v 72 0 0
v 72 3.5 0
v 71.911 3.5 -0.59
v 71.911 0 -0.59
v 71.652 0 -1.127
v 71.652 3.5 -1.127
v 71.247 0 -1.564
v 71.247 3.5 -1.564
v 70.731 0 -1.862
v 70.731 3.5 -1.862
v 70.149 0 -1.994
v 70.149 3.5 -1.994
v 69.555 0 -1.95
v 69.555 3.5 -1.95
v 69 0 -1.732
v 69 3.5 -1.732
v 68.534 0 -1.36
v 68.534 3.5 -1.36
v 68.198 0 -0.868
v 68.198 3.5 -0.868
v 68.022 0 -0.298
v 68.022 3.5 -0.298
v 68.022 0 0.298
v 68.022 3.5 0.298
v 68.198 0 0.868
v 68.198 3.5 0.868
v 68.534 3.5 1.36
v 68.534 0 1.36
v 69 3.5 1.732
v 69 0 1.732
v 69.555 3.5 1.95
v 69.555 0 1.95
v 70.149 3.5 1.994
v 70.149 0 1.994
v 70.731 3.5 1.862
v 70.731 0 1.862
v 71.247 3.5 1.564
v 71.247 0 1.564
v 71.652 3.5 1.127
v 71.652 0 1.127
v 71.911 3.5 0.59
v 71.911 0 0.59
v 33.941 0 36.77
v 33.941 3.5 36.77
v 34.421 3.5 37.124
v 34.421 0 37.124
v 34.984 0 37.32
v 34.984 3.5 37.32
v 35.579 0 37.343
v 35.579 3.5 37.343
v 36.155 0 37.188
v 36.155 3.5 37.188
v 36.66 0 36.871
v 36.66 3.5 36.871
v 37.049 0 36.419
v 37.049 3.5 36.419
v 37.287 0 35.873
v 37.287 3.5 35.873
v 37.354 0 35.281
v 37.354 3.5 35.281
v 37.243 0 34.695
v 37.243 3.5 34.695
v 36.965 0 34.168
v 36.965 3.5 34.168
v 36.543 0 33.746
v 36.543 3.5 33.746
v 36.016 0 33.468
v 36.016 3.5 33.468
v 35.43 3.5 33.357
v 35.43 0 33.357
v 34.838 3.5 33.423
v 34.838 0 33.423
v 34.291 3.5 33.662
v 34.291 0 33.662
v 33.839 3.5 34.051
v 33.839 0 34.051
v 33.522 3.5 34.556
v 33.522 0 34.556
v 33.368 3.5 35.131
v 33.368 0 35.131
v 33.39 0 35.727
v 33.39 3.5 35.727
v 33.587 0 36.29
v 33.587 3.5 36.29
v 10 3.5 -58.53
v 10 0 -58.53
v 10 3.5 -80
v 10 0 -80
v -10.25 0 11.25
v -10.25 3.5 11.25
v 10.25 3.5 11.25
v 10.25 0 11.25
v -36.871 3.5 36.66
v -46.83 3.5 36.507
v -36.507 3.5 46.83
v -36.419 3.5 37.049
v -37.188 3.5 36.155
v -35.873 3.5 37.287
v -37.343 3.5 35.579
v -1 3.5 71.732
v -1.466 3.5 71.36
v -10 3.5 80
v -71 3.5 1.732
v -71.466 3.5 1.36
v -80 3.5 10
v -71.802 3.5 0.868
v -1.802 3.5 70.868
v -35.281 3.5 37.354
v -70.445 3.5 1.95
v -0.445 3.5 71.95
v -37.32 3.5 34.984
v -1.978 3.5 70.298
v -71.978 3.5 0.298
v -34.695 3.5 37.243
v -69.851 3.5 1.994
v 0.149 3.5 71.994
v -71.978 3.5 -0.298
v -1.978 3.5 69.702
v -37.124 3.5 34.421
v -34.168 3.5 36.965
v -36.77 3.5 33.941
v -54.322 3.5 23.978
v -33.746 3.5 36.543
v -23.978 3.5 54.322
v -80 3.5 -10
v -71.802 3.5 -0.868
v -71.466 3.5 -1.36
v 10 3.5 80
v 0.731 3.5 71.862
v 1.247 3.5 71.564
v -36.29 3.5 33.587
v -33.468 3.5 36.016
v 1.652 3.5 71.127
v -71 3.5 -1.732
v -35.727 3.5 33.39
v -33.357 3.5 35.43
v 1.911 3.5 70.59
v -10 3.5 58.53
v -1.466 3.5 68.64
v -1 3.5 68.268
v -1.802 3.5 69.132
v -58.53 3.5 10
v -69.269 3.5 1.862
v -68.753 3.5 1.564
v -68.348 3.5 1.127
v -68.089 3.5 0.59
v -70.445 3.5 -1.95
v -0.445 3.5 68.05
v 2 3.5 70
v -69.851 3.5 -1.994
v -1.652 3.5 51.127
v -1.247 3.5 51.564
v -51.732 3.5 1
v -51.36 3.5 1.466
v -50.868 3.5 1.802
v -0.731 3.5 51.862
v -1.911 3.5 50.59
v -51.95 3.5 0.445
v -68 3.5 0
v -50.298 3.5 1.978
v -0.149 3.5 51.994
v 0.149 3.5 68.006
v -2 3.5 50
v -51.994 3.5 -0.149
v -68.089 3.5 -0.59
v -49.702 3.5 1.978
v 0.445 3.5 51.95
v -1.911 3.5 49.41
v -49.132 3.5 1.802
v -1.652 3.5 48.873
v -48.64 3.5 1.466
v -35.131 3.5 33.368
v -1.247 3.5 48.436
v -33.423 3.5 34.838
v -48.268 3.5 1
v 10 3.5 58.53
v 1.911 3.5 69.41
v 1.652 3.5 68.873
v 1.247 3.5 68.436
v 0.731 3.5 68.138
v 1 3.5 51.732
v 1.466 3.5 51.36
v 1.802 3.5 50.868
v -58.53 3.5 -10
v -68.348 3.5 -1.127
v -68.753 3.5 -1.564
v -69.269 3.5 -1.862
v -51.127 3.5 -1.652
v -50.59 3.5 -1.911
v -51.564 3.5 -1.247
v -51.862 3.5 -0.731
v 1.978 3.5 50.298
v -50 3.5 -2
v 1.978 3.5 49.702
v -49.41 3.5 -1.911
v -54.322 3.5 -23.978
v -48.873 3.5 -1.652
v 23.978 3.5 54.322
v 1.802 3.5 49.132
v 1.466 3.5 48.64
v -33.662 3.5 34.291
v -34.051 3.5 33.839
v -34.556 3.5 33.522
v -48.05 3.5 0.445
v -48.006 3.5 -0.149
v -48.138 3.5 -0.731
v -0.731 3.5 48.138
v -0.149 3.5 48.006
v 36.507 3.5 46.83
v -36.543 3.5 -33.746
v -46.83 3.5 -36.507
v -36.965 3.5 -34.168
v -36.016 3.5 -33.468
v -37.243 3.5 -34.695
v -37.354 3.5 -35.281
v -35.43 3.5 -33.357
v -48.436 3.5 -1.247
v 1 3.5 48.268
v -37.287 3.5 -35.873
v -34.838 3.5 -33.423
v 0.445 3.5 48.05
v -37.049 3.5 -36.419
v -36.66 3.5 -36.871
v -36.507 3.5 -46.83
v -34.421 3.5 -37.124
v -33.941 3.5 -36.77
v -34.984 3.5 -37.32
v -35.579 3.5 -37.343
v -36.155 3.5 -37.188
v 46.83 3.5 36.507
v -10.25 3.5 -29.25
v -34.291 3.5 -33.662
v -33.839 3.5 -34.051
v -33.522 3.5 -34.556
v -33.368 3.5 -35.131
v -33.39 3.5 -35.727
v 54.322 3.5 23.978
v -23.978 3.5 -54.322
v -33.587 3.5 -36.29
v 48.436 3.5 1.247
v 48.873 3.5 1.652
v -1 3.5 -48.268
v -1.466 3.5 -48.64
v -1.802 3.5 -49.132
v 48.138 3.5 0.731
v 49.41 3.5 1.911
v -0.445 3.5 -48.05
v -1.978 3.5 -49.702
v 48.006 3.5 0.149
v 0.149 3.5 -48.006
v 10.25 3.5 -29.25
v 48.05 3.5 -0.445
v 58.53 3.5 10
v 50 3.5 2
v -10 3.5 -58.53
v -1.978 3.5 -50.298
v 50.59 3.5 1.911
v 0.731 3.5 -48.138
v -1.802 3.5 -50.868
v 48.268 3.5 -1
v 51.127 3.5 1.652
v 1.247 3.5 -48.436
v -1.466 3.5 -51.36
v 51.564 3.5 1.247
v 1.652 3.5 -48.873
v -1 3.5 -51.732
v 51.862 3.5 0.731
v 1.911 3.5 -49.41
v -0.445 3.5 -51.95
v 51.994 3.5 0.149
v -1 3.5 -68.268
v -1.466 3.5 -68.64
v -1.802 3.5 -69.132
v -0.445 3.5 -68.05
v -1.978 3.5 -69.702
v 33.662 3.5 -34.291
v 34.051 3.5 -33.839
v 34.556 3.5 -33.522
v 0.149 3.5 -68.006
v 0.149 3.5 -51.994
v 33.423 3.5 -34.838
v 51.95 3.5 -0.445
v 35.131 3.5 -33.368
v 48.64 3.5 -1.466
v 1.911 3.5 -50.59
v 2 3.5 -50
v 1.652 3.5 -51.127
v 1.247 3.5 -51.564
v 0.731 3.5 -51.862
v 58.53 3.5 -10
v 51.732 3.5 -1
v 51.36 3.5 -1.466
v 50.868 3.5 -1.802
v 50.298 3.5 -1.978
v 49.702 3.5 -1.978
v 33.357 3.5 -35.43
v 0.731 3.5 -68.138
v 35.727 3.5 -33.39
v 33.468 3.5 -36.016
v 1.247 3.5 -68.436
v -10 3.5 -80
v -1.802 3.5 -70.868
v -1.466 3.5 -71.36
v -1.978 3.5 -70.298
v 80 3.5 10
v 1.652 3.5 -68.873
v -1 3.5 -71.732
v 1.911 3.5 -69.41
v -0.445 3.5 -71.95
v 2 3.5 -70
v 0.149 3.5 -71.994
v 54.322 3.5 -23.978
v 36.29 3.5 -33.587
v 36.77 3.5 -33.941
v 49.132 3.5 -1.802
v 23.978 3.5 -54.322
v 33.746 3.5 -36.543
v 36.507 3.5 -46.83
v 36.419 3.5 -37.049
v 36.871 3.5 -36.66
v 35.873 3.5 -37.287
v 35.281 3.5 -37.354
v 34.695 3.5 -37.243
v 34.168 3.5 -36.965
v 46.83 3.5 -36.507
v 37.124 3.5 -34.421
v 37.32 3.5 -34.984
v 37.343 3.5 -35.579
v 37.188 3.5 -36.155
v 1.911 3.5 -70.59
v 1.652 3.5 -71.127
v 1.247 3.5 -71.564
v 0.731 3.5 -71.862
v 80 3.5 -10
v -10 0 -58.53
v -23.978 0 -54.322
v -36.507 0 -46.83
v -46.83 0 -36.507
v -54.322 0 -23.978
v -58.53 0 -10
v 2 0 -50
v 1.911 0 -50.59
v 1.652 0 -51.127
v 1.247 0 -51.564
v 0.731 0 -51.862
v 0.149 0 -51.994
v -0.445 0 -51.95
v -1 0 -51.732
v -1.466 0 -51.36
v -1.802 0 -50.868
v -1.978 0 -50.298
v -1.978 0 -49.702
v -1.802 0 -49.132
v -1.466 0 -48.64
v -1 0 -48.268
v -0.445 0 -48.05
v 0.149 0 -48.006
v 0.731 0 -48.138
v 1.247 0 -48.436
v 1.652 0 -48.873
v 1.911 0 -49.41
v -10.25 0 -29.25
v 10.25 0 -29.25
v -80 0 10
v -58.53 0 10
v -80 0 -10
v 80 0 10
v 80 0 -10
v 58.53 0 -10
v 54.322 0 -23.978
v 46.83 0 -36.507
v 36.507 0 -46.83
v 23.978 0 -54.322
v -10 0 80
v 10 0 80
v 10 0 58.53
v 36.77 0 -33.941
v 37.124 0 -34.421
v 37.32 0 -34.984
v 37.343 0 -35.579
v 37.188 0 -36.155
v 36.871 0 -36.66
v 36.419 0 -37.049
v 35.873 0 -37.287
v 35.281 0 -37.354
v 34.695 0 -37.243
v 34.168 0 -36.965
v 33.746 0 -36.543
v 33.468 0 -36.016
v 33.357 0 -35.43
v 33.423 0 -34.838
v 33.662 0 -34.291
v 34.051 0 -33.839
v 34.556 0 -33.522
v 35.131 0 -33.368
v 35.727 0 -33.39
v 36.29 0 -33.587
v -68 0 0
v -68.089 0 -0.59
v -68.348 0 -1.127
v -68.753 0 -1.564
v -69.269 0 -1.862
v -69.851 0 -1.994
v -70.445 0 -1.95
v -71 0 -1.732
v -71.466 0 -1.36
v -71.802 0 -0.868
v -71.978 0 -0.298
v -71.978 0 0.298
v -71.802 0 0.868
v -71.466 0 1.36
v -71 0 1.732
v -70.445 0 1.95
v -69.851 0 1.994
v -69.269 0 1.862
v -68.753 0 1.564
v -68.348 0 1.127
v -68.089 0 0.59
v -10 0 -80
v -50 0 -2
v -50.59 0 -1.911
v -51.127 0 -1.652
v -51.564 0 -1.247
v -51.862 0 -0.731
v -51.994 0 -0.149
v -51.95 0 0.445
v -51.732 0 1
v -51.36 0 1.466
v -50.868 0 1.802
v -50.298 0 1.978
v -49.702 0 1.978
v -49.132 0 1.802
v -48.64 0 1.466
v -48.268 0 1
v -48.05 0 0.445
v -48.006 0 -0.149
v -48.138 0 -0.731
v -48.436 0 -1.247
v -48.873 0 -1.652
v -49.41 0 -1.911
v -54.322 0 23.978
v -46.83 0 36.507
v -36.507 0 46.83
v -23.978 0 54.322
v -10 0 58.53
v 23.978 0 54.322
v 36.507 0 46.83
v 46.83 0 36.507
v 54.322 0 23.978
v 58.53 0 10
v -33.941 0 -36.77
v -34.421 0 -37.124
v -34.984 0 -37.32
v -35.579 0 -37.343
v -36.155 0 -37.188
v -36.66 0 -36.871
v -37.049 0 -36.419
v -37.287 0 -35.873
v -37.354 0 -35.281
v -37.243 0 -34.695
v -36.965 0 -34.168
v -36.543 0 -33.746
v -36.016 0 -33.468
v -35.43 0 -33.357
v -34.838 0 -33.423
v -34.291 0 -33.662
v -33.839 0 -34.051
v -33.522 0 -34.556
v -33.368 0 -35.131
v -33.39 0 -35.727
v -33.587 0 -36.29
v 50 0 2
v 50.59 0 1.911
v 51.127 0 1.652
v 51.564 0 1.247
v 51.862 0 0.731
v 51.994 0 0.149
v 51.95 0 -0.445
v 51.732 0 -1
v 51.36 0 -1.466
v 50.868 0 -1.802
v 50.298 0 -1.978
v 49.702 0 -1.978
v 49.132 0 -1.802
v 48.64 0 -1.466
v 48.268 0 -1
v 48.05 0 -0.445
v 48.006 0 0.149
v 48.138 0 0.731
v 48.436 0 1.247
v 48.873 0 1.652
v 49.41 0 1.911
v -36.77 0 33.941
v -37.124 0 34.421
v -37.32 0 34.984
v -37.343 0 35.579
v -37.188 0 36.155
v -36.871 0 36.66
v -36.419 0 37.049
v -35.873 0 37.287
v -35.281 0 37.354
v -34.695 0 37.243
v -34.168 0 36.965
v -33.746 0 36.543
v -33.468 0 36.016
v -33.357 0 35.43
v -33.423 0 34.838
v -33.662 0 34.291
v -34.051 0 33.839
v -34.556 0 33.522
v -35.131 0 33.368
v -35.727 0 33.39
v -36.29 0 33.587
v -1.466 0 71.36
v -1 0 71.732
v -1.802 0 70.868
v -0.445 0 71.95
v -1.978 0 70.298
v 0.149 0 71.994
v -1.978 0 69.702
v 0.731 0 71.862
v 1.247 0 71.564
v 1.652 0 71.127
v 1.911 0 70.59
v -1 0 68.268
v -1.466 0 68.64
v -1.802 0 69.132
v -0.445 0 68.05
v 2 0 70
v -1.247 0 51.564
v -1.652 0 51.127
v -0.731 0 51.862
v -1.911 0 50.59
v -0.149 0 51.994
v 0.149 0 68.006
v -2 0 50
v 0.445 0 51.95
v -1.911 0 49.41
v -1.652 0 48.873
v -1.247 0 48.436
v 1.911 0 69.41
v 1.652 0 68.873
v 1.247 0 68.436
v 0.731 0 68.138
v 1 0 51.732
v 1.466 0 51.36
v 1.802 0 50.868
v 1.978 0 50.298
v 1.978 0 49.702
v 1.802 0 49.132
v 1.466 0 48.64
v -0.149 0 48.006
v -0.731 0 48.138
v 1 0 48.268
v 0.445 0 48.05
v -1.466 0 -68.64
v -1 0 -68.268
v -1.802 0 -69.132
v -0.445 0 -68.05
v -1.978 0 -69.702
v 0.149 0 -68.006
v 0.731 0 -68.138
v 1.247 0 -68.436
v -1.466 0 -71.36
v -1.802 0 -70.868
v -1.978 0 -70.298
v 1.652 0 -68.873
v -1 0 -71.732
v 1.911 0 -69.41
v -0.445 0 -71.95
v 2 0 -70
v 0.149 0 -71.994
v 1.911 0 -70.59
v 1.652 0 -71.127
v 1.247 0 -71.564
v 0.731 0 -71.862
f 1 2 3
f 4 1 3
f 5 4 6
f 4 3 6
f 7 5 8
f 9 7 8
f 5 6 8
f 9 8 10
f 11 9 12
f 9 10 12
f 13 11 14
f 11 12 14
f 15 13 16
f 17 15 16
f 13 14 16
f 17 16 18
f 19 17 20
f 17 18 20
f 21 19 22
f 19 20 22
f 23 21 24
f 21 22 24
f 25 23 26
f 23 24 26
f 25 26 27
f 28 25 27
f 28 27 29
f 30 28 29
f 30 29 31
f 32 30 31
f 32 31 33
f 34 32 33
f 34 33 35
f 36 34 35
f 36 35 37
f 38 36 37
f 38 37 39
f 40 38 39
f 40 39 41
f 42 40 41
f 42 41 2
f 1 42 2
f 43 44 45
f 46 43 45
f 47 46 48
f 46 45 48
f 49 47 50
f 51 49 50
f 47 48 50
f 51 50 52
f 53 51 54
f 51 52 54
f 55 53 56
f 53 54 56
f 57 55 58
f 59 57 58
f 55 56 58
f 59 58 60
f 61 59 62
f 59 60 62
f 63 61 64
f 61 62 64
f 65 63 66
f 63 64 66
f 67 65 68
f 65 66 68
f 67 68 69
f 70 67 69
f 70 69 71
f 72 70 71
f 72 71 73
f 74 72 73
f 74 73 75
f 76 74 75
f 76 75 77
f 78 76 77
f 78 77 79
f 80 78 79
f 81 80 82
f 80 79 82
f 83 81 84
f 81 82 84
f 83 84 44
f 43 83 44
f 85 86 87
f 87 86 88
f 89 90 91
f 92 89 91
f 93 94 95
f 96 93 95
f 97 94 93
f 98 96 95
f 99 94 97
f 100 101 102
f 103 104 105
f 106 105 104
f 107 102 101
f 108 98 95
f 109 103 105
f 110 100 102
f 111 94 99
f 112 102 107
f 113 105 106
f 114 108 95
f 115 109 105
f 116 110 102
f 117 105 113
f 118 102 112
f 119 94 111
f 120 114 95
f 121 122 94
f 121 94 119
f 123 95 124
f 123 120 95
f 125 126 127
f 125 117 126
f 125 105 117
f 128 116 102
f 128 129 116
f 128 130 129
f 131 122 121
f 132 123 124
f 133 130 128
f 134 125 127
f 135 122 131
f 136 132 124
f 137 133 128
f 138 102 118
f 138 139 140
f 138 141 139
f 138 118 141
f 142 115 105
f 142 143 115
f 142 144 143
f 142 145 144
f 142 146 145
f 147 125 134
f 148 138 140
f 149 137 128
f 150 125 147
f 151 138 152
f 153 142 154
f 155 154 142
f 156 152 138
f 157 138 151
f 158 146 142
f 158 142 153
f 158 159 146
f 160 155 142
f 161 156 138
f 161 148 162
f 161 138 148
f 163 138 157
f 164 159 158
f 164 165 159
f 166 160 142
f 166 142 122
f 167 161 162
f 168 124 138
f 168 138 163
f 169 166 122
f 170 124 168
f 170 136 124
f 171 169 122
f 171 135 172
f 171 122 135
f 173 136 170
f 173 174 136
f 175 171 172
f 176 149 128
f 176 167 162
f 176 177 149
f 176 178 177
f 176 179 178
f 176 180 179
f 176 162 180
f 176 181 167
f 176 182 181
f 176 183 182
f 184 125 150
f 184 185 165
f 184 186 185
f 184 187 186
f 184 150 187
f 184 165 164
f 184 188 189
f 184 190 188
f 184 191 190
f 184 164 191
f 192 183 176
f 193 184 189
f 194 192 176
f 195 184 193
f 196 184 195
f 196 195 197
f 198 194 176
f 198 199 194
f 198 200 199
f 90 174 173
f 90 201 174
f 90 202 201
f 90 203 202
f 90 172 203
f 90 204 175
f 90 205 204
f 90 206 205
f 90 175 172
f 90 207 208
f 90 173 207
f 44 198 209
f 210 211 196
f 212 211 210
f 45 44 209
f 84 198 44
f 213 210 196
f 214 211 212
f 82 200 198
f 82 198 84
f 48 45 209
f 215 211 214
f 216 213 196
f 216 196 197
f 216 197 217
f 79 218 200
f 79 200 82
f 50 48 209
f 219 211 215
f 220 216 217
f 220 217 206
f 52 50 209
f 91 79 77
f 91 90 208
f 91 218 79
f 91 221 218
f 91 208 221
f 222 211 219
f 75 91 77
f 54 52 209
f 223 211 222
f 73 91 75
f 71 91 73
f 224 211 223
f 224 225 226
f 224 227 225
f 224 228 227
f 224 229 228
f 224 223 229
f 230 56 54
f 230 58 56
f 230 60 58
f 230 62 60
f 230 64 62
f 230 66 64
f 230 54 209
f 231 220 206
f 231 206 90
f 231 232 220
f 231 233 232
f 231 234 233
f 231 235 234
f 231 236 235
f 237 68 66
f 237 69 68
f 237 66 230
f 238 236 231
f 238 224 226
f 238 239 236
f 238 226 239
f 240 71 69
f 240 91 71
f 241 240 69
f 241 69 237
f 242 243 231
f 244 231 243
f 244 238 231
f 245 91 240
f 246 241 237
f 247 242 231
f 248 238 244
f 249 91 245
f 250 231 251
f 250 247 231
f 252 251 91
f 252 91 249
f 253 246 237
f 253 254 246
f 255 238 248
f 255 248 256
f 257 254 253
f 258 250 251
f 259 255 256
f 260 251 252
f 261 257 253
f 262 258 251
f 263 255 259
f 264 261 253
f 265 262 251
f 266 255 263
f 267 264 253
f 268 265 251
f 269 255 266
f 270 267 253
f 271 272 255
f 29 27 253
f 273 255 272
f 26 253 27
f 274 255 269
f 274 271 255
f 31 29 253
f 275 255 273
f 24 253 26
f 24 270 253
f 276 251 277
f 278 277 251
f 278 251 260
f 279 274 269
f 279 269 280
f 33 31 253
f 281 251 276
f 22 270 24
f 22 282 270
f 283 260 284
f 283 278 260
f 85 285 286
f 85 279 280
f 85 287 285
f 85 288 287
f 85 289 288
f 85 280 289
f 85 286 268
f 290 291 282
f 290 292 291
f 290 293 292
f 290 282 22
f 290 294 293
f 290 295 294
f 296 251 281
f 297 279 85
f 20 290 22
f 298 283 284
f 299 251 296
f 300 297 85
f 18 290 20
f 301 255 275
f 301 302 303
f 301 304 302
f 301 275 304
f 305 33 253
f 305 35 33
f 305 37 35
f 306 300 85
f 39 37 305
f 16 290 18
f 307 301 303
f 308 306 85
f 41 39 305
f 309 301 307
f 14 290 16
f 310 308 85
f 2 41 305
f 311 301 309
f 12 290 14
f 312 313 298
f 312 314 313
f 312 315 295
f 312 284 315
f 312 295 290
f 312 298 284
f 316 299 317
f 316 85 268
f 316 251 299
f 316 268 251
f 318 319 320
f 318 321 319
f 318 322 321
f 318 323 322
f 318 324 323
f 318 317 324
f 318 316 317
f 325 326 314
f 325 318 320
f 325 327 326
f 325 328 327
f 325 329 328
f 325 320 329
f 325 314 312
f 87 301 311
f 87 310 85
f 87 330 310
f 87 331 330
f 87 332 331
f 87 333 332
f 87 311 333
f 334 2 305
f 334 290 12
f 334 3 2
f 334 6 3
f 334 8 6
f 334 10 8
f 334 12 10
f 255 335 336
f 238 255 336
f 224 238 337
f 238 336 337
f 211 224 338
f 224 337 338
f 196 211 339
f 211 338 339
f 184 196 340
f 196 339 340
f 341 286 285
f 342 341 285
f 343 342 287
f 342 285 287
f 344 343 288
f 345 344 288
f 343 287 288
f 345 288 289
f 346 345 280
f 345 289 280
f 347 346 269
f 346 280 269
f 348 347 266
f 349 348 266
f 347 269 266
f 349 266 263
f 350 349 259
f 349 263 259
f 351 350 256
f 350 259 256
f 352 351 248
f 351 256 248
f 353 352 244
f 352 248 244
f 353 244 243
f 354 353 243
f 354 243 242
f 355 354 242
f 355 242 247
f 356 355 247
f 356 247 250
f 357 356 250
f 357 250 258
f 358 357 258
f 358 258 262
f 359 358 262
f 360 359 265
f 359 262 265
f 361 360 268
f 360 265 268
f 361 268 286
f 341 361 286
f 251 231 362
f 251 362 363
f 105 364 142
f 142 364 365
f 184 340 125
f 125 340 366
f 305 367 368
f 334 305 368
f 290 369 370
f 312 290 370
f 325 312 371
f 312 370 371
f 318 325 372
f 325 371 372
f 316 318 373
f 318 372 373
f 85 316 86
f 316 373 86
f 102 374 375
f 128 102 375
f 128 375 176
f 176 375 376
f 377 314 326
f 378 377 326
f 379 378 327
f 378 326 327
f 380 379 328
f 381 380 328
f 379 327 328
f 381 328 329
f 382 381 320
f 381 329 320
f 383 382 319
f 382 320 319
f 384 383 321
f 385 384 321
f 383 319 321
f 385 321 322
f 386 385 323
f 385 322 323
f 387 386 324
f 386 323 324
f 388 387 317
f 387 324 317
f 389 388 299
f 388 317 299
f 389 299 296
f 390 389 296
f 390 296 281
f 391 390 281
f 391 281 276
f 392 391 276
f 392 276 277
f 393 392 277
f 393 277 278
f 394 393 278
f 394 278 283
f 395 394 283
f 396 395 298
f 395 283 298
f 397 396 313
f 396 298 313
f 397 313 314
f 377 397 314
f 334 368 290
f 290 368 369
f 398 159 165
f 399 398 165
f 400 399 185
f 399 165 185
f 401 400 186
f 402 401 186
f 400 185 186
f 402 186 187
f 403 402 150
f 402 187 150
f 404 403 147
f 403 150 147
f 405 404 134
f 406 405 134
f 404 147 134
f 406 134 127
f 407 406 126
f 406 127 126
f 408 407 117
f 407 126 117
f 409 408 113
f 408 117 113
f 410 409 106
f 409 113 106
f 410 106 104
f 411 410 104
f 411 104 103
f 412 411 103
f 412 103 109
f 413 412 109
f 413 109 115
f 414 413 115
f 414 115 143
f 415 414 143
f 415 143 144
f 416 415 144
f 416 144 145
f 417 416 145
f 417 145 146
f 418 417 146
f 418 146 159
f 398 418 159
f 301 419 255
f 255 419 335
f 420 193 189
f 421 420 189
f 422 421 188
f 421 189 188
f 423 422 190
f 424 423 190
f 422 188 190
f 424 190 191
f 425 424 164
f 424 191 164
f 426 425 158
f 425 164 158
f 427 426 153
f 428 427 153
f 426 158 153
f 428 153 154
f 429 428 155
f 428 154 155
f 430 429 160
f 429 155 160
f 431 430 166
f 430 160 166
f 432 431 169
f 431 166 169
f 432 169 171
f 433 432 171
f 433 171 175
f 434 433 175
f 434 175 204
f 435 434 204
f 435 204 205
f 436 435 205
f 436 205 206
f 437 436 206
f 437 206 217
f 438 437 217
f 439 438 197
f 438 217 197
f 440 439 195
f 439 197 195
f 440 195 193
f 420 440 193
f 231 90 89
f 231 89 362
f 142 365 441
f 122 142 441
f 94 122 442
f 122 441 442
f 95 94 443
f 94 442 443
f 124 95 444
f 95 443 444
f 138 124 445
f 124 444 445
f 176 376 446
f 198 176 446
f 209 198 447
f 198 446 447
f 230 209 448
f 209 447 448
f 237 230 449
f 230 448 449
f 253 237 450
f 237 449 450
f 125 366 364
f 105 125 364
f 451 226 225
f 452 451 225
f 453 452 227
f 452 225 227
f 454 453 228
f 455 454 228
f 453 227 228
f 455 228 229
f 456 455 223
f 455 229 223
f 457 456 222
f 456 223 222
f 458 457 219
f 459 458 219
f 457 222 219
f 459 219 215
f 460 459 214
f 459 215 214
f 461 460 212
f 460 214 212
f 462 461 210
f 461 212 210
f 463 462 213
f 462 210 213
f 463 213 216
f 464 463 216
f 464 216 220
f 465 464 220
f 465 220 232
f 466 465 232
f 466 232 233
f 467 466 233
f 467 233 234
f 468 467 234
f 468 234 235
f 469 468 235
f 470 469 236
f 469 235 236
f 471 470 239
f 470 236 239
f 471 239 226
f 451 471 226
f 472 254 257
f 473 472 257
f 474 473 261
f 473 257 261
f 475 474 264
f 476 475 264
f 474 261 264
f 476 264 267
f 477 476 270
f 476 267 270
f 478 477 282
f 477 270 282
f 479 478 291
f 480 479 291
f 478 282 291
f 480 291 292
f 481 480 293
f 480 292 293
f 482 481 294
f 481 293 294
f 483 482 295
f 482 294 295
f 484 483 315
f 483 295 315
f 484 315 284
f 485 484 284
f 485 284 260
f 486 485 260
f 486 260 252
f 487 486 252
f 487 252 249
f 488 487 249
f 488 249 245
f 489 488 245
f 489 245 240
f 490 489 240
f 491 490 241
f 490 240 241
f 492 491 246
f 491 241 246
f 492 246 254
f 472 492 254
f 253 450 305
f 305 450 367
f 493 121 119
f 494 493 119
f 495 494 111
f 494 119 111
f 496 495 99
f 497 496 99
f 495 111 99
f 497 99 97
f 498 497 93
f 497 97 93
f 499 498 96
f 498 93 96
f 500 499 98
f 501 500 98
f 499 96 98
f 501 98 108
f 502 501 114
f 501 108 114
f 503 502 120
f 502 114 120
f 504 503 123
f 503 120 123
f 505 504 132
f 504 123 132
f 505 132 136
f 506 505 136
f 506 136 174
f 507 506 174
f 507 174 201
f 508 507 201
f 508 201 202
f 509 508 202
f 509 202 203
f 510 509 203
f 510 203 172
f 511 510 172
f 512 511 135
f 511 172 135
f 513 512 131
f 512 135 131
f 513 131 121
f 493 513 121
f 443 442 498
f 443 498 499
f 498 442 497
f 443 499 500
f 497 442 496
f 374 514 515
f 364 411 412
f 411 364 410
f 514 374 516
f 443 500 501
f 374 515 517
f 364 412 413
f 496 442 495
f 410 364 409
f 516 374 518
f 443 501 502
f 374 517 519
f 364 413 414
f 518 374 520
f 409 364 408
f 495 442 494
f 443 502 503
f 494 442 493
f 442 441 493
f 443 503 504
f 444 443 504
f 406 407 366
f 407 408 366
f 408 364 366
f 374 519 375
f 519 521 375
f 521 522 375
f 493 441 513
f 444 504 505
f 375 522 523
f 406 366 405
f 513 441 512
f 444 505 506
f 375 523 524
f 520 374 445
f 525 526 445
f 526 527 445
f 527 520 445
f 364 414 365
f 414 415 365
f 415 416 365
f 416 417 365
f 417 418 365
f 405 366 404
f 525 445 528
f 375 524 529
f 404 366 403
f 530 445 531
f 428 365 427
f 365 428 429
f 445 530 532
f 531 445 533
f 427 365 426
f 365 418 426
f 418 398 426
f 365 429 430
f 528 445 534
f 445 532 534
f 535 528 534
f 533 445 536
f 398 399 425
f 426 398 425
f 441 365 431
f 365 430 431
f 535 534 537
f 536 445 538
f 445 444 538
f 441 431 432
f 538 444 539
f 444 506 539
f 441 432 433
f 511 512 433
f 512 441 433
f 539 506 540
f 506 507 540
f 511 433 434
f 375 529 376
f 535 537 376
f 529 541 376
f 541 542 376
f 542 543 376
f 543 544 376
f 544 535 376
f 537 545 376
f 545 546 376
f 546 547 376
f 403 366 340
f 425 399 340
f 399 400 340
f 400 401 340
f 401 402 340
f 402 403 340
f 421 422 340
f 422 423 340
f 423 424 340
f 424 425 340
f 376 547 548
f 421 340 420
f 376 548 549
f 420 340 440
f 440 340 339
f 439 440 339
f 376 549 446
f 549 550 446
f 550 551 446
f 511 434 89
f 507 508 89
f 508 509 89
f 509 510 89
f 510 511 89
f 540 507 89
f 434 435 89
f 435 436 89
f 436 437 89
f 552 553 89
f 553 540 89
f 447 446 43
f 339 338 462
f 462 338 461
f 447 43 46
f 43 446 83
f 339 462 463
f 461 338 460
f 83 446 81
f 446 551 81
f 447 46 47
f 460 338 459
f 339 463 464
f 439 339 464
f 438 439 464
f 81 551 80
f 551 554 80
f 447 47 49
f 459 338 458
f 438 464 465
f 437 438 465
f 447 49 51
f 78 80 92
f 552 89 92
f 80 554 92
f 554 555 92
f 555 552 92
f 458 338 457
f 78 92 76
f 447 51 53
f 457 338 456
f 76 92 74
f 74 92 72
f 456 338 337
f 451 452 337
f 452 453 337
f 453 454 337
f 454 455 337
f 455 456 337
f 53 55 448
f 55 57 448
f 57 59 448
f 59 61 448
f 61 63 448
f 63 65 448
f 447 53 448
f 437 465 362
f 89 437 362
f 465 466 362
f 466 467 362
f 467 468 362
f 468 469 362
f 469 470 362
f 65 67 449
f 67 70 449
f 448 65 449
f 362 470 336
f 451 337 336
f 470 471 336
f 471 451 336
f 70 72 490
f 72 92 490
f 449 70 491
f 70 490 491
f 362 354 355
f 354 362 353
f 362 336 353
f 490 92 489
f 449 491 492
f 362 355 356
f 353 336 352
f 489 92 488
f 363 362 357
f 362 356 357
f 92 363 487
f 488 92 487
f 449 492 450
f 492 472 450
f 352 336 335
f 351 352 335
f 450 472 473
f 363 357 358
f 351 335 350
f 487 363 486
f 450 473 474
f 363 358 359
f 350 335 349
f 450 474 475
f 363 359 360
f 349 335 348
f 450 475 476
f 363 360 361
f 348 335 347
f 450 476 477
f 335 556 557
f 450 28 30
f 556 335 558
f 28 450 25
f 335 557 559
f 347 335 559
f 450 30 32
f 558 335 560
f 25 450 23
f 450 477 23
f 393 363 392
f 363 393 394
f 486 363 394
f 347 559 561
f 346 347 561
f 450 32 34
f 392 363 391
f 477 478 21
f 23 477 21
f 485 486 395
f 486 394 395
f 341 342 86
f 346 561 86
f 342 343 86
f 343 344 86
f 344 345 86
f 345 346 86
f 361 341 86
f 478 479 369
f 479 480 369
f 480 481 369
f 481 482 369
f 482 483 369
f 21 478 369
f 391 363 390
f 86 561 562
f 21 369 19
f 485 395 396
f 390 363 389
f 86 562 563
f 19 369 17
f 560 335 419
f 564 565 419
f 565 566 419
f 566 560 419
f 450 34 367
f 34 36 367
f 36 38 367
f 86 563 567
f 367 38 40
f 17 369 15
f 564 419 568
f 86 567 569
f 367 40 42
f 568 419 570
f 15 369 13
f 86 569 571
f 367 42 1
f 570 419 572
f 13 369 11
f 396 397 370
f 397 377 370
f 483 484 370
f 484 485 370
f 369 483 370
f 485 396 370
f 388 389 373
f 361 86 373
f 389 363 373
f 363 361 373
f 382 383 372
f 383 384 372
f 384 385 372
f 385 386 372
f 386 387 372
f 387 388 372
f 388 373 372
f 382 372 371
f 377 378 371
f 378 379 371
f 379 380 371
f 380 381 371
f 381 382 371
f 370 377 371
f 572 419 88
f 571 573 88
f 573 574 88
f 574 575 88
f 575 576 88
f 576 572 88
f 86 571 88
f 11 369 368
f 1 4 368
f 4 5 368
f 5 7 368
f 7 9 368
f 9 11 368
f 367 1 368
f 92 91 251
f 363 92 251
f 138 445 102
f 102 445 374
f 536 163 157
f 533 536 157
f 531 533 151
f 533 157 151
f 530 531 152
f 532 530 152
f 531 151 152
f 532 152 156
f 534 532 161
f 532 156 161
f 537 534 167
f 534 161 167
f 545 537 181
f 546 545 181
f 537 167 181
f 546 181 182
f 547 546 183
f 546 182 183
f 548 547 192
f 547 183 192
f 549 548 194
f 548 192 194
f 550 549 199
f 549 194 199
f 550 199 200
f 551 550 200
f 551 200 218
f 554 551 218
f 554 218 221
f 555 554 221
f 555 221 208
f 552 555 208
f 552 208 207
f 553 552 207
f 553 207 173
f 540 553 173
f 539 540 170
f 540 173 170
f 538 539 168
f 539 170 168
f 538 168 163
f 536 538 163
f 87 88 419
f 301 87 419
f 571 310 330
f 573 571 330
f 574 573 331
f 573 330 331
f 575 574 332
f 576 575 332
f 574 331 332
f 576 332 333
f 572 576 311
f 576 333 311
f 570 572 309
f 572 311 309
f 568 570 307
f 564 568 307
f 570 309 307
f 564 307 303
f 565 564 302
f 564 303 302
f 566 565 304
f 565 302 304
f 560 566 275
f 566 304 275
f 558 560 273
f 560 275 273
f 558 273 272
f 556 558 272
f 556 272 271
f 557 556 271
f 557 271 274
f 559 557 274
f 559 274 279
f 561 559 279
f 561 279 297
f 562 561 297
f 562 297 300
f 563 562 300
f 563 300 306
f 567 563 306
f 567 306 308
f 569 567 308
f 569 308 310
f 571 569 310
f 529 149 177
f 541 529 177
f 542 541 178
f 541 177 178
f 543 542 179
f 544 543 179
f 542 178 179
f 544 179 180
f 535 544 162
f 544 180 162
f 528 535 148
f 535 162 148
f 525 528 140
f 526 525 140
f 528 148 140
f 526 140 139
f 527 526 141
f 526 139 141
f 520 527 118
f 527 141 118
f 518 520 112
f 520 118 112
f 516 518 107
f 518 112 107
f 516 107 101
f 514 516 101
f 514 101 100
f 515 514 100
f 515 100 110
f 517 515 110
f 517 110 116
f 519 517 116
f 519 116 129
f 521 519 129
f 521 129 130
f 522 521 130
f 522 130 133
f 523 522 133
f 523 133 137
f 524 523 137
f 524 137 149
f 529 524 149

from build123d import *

# Parameters (mm, degrees)
SALIENTE_EXTRUIR1_DEPTH = 3.5
CROQUIS2_R              = 2
CORTAR_EXTRUIR1_DEPTH   = 3.5
MATRIZC1_COUNT          = 8
CORTAR_EXTRUIR2_REACH   = 5.5
CROQUIS3_W              = 20.5
CROQUIS3_H              = 40.5
CORTAR_EXTRUIR3_REACH   = 5.5
CROQUIS4_R              = 2


with BuildPart() as part:
    # Croquis1 → Saliente-Extruir1 (new body)
    with BuildSketch(Plane(origin=(0, 0, 0), x_dir=(1, 0, 0), z_dir=(0, 1, 0))):
        with BuildLine():
            Line((-10, -58.530413525), (-10, -80))
            Line((-10, -80), (10, -80))
            Line((10, -80), (10, -58.530413525))
            ThreePointArc((10, -58.530413525), (41.986958138, -41.986958138), (58.530413525, -10))
            Line((58.530413525, -10), (80, -10))
            Line((80, -10), (80, 10))
            Line((80, 10), (58.530413525, 10))
            ThreePointArc((58.530413525, 10), (41.986958138, 41.986958138), (10, 58.530413525))
            Line((10, 58.530413525), (10, 80))
            Line((10, 80), (-10, 80))
            Line((-10, 80), (-10, 58.530413525))
            ThreePointArc((-10, 58.530413525), (-41.986958138, 41.986958138), (-58.530413525, 10))
            Line((-58.530413525, 10), (-80, 10))
            Line((-80, 10), (-80, -10))
            Line((-80, -10), (-58.530413525, -10))
            ThreePointArc((-58.530413525, -10), (-41.986958138, -41.986958138), (-10, -58.530413525))
        make_face()
    extrude(amount=SALIENTE_EXTRUIR1_DEPTH)

    # Croquis2 → Cortar-Extruir1 (cut)
    with BuildSketch(Plane(origin=(0, 3.5, 0), x_dir=(1, 0, 0), z_dir=(0, 1, 0))):
        with Locations((0, 50)):
            Circle(CROQUIS2_R)
    cortar_extruir1 = extrude(amount=-CORTAR_EXTRUIR1_DEPTH, mode=Mode.SUBTRACT)

    # MatrizC1: Cortar-Extruir1 ×8 about axis
    matrizc1_axis = Axis((0, 0, 0), (0, 1, 0))
    for i in range(1, MATRIZC1_COUNT):
        add(cortar_extruir1.rotate(matrizc1_axis, i * 360 / MATRIZC1_COUNT), mode=Mode.SUBTRACT)

    # Croquis3 → Cortar-Extruir2 (cut, up to next)
    with BuildSketch(Plane(origin=(0, 3.5, 0), x_dir=(1, 0, 0), z_dir=(0, 1, 0)), mode=Mode.PRIVATE) as cortar_extruir2_sk1:
        with Locations((0, 9)):
            Rectangle(CROQUIS3_W, CROQUIS3_H)
    cortar_extruir2_tool1 = extrude(cortar_extruir2_sk1.sketch, amount=-CORTAR_EXTRUIR2_REACH, mode=Mode.PRIVATE) & part.part
    add(cortar_extruir2_tool1.solids().sort_by_distance((0, 3.5, -9))[0], mode=Mode.SUBTRACT)

    # Croquis4 → Cortar-Extruir3 (cut, up to next)
    with BuildSketch(Plane(origin=(0, 3.5, 0), x_dir=(1, 0, 0), z_dir=(0, 1, 0)), mode=Mode.PRIVATE) as cortar_extruir3_sk1:
        with Locations((0, 70)):
            Circle(CROQUIS4_R)
    cortar_extruir3_tool1 = extrude(cortar_extruir3_sk1.sketch, amount=-CORTAR_EXTRUIR3_REACH, mode=Mode.PRIVATE) & part.part
    add(cortar_extruir3_tool1.solids().sort_by_distance((0, 3.5, -70))[0], mode=Mode.SUBTRACT)
    # Croquis4 → Cortar-Extruir3 (cut, up to next)
    with BuildSketch(Plane(origin=(0, 3.5, 0), x_dir=(1, 0, 0), z_dir=(0, 1, 0)), mode=Mode.PRIVATE) as cortar_extruir3_sk2:
        with Locations((70, 0)):
            Circle(CROQUIS4_R)
    cortar_extruir3_tool2 = extrude(cortar_extruir3_sk2.sketch, amount=-CORTAR_EXTRUIR3_REACH, mode=Mode.PRIVATE) & part.part
    add(cortar_extruir3_tool2.solids().sort_by_distance((70, 3.5, 0))[0], mode=Mode.SUBTRACT)
    # Croquis4 → Cortar-Extruir3 (cut, up to next)
    with BuildSketch(Plane(origin=(0, 3.5, 0), x_dir=(1, 0, 0), z_dir=(0, 1, 0)), mode=Mode.PRIVATE) as cortar_extruir3_sk3:
        with Locations((0, -70)):
            Circle(CROQUIS4_R)
    cortar_extruir3_tool3 = extrude(cortar_extruir3_sk3.sketch, amount=-CORTAR_EXTRUIR3_REACH, mode=Mode.PRIVATE) & part.part
    add(cortar_extruir3_tool3.solids().sort_by_distance((0, 3.5, 70))[0], mode=Mode.SUBTRACT)
    # Croquis4 → Cortar-Extruir3 (cut, up to next)
    with BuildSketch(Plane(origin=(0, 3.5, 0), x_dir=(1, 0, 0), z_dir=(0, 1, 0)), mode=Mode.PRIVATE) as cortar_extruir3_sk4:
        with Locations((-70, 0)):
            Circle(CROQUIS4_R)
    cortar_extruir3_tool4 = extrude(cortar_extruir3_sk4.sketch, amount=-CORTAR_EXTRUIR3_REACH, mode=Mode.PRIVATE) & part.part
    add(cortar_extruir3_tool4.solids().sort_by_distance((-70, 3.5, 0))[0], mode=Mode.SUBTRACT)


solid = part.part
